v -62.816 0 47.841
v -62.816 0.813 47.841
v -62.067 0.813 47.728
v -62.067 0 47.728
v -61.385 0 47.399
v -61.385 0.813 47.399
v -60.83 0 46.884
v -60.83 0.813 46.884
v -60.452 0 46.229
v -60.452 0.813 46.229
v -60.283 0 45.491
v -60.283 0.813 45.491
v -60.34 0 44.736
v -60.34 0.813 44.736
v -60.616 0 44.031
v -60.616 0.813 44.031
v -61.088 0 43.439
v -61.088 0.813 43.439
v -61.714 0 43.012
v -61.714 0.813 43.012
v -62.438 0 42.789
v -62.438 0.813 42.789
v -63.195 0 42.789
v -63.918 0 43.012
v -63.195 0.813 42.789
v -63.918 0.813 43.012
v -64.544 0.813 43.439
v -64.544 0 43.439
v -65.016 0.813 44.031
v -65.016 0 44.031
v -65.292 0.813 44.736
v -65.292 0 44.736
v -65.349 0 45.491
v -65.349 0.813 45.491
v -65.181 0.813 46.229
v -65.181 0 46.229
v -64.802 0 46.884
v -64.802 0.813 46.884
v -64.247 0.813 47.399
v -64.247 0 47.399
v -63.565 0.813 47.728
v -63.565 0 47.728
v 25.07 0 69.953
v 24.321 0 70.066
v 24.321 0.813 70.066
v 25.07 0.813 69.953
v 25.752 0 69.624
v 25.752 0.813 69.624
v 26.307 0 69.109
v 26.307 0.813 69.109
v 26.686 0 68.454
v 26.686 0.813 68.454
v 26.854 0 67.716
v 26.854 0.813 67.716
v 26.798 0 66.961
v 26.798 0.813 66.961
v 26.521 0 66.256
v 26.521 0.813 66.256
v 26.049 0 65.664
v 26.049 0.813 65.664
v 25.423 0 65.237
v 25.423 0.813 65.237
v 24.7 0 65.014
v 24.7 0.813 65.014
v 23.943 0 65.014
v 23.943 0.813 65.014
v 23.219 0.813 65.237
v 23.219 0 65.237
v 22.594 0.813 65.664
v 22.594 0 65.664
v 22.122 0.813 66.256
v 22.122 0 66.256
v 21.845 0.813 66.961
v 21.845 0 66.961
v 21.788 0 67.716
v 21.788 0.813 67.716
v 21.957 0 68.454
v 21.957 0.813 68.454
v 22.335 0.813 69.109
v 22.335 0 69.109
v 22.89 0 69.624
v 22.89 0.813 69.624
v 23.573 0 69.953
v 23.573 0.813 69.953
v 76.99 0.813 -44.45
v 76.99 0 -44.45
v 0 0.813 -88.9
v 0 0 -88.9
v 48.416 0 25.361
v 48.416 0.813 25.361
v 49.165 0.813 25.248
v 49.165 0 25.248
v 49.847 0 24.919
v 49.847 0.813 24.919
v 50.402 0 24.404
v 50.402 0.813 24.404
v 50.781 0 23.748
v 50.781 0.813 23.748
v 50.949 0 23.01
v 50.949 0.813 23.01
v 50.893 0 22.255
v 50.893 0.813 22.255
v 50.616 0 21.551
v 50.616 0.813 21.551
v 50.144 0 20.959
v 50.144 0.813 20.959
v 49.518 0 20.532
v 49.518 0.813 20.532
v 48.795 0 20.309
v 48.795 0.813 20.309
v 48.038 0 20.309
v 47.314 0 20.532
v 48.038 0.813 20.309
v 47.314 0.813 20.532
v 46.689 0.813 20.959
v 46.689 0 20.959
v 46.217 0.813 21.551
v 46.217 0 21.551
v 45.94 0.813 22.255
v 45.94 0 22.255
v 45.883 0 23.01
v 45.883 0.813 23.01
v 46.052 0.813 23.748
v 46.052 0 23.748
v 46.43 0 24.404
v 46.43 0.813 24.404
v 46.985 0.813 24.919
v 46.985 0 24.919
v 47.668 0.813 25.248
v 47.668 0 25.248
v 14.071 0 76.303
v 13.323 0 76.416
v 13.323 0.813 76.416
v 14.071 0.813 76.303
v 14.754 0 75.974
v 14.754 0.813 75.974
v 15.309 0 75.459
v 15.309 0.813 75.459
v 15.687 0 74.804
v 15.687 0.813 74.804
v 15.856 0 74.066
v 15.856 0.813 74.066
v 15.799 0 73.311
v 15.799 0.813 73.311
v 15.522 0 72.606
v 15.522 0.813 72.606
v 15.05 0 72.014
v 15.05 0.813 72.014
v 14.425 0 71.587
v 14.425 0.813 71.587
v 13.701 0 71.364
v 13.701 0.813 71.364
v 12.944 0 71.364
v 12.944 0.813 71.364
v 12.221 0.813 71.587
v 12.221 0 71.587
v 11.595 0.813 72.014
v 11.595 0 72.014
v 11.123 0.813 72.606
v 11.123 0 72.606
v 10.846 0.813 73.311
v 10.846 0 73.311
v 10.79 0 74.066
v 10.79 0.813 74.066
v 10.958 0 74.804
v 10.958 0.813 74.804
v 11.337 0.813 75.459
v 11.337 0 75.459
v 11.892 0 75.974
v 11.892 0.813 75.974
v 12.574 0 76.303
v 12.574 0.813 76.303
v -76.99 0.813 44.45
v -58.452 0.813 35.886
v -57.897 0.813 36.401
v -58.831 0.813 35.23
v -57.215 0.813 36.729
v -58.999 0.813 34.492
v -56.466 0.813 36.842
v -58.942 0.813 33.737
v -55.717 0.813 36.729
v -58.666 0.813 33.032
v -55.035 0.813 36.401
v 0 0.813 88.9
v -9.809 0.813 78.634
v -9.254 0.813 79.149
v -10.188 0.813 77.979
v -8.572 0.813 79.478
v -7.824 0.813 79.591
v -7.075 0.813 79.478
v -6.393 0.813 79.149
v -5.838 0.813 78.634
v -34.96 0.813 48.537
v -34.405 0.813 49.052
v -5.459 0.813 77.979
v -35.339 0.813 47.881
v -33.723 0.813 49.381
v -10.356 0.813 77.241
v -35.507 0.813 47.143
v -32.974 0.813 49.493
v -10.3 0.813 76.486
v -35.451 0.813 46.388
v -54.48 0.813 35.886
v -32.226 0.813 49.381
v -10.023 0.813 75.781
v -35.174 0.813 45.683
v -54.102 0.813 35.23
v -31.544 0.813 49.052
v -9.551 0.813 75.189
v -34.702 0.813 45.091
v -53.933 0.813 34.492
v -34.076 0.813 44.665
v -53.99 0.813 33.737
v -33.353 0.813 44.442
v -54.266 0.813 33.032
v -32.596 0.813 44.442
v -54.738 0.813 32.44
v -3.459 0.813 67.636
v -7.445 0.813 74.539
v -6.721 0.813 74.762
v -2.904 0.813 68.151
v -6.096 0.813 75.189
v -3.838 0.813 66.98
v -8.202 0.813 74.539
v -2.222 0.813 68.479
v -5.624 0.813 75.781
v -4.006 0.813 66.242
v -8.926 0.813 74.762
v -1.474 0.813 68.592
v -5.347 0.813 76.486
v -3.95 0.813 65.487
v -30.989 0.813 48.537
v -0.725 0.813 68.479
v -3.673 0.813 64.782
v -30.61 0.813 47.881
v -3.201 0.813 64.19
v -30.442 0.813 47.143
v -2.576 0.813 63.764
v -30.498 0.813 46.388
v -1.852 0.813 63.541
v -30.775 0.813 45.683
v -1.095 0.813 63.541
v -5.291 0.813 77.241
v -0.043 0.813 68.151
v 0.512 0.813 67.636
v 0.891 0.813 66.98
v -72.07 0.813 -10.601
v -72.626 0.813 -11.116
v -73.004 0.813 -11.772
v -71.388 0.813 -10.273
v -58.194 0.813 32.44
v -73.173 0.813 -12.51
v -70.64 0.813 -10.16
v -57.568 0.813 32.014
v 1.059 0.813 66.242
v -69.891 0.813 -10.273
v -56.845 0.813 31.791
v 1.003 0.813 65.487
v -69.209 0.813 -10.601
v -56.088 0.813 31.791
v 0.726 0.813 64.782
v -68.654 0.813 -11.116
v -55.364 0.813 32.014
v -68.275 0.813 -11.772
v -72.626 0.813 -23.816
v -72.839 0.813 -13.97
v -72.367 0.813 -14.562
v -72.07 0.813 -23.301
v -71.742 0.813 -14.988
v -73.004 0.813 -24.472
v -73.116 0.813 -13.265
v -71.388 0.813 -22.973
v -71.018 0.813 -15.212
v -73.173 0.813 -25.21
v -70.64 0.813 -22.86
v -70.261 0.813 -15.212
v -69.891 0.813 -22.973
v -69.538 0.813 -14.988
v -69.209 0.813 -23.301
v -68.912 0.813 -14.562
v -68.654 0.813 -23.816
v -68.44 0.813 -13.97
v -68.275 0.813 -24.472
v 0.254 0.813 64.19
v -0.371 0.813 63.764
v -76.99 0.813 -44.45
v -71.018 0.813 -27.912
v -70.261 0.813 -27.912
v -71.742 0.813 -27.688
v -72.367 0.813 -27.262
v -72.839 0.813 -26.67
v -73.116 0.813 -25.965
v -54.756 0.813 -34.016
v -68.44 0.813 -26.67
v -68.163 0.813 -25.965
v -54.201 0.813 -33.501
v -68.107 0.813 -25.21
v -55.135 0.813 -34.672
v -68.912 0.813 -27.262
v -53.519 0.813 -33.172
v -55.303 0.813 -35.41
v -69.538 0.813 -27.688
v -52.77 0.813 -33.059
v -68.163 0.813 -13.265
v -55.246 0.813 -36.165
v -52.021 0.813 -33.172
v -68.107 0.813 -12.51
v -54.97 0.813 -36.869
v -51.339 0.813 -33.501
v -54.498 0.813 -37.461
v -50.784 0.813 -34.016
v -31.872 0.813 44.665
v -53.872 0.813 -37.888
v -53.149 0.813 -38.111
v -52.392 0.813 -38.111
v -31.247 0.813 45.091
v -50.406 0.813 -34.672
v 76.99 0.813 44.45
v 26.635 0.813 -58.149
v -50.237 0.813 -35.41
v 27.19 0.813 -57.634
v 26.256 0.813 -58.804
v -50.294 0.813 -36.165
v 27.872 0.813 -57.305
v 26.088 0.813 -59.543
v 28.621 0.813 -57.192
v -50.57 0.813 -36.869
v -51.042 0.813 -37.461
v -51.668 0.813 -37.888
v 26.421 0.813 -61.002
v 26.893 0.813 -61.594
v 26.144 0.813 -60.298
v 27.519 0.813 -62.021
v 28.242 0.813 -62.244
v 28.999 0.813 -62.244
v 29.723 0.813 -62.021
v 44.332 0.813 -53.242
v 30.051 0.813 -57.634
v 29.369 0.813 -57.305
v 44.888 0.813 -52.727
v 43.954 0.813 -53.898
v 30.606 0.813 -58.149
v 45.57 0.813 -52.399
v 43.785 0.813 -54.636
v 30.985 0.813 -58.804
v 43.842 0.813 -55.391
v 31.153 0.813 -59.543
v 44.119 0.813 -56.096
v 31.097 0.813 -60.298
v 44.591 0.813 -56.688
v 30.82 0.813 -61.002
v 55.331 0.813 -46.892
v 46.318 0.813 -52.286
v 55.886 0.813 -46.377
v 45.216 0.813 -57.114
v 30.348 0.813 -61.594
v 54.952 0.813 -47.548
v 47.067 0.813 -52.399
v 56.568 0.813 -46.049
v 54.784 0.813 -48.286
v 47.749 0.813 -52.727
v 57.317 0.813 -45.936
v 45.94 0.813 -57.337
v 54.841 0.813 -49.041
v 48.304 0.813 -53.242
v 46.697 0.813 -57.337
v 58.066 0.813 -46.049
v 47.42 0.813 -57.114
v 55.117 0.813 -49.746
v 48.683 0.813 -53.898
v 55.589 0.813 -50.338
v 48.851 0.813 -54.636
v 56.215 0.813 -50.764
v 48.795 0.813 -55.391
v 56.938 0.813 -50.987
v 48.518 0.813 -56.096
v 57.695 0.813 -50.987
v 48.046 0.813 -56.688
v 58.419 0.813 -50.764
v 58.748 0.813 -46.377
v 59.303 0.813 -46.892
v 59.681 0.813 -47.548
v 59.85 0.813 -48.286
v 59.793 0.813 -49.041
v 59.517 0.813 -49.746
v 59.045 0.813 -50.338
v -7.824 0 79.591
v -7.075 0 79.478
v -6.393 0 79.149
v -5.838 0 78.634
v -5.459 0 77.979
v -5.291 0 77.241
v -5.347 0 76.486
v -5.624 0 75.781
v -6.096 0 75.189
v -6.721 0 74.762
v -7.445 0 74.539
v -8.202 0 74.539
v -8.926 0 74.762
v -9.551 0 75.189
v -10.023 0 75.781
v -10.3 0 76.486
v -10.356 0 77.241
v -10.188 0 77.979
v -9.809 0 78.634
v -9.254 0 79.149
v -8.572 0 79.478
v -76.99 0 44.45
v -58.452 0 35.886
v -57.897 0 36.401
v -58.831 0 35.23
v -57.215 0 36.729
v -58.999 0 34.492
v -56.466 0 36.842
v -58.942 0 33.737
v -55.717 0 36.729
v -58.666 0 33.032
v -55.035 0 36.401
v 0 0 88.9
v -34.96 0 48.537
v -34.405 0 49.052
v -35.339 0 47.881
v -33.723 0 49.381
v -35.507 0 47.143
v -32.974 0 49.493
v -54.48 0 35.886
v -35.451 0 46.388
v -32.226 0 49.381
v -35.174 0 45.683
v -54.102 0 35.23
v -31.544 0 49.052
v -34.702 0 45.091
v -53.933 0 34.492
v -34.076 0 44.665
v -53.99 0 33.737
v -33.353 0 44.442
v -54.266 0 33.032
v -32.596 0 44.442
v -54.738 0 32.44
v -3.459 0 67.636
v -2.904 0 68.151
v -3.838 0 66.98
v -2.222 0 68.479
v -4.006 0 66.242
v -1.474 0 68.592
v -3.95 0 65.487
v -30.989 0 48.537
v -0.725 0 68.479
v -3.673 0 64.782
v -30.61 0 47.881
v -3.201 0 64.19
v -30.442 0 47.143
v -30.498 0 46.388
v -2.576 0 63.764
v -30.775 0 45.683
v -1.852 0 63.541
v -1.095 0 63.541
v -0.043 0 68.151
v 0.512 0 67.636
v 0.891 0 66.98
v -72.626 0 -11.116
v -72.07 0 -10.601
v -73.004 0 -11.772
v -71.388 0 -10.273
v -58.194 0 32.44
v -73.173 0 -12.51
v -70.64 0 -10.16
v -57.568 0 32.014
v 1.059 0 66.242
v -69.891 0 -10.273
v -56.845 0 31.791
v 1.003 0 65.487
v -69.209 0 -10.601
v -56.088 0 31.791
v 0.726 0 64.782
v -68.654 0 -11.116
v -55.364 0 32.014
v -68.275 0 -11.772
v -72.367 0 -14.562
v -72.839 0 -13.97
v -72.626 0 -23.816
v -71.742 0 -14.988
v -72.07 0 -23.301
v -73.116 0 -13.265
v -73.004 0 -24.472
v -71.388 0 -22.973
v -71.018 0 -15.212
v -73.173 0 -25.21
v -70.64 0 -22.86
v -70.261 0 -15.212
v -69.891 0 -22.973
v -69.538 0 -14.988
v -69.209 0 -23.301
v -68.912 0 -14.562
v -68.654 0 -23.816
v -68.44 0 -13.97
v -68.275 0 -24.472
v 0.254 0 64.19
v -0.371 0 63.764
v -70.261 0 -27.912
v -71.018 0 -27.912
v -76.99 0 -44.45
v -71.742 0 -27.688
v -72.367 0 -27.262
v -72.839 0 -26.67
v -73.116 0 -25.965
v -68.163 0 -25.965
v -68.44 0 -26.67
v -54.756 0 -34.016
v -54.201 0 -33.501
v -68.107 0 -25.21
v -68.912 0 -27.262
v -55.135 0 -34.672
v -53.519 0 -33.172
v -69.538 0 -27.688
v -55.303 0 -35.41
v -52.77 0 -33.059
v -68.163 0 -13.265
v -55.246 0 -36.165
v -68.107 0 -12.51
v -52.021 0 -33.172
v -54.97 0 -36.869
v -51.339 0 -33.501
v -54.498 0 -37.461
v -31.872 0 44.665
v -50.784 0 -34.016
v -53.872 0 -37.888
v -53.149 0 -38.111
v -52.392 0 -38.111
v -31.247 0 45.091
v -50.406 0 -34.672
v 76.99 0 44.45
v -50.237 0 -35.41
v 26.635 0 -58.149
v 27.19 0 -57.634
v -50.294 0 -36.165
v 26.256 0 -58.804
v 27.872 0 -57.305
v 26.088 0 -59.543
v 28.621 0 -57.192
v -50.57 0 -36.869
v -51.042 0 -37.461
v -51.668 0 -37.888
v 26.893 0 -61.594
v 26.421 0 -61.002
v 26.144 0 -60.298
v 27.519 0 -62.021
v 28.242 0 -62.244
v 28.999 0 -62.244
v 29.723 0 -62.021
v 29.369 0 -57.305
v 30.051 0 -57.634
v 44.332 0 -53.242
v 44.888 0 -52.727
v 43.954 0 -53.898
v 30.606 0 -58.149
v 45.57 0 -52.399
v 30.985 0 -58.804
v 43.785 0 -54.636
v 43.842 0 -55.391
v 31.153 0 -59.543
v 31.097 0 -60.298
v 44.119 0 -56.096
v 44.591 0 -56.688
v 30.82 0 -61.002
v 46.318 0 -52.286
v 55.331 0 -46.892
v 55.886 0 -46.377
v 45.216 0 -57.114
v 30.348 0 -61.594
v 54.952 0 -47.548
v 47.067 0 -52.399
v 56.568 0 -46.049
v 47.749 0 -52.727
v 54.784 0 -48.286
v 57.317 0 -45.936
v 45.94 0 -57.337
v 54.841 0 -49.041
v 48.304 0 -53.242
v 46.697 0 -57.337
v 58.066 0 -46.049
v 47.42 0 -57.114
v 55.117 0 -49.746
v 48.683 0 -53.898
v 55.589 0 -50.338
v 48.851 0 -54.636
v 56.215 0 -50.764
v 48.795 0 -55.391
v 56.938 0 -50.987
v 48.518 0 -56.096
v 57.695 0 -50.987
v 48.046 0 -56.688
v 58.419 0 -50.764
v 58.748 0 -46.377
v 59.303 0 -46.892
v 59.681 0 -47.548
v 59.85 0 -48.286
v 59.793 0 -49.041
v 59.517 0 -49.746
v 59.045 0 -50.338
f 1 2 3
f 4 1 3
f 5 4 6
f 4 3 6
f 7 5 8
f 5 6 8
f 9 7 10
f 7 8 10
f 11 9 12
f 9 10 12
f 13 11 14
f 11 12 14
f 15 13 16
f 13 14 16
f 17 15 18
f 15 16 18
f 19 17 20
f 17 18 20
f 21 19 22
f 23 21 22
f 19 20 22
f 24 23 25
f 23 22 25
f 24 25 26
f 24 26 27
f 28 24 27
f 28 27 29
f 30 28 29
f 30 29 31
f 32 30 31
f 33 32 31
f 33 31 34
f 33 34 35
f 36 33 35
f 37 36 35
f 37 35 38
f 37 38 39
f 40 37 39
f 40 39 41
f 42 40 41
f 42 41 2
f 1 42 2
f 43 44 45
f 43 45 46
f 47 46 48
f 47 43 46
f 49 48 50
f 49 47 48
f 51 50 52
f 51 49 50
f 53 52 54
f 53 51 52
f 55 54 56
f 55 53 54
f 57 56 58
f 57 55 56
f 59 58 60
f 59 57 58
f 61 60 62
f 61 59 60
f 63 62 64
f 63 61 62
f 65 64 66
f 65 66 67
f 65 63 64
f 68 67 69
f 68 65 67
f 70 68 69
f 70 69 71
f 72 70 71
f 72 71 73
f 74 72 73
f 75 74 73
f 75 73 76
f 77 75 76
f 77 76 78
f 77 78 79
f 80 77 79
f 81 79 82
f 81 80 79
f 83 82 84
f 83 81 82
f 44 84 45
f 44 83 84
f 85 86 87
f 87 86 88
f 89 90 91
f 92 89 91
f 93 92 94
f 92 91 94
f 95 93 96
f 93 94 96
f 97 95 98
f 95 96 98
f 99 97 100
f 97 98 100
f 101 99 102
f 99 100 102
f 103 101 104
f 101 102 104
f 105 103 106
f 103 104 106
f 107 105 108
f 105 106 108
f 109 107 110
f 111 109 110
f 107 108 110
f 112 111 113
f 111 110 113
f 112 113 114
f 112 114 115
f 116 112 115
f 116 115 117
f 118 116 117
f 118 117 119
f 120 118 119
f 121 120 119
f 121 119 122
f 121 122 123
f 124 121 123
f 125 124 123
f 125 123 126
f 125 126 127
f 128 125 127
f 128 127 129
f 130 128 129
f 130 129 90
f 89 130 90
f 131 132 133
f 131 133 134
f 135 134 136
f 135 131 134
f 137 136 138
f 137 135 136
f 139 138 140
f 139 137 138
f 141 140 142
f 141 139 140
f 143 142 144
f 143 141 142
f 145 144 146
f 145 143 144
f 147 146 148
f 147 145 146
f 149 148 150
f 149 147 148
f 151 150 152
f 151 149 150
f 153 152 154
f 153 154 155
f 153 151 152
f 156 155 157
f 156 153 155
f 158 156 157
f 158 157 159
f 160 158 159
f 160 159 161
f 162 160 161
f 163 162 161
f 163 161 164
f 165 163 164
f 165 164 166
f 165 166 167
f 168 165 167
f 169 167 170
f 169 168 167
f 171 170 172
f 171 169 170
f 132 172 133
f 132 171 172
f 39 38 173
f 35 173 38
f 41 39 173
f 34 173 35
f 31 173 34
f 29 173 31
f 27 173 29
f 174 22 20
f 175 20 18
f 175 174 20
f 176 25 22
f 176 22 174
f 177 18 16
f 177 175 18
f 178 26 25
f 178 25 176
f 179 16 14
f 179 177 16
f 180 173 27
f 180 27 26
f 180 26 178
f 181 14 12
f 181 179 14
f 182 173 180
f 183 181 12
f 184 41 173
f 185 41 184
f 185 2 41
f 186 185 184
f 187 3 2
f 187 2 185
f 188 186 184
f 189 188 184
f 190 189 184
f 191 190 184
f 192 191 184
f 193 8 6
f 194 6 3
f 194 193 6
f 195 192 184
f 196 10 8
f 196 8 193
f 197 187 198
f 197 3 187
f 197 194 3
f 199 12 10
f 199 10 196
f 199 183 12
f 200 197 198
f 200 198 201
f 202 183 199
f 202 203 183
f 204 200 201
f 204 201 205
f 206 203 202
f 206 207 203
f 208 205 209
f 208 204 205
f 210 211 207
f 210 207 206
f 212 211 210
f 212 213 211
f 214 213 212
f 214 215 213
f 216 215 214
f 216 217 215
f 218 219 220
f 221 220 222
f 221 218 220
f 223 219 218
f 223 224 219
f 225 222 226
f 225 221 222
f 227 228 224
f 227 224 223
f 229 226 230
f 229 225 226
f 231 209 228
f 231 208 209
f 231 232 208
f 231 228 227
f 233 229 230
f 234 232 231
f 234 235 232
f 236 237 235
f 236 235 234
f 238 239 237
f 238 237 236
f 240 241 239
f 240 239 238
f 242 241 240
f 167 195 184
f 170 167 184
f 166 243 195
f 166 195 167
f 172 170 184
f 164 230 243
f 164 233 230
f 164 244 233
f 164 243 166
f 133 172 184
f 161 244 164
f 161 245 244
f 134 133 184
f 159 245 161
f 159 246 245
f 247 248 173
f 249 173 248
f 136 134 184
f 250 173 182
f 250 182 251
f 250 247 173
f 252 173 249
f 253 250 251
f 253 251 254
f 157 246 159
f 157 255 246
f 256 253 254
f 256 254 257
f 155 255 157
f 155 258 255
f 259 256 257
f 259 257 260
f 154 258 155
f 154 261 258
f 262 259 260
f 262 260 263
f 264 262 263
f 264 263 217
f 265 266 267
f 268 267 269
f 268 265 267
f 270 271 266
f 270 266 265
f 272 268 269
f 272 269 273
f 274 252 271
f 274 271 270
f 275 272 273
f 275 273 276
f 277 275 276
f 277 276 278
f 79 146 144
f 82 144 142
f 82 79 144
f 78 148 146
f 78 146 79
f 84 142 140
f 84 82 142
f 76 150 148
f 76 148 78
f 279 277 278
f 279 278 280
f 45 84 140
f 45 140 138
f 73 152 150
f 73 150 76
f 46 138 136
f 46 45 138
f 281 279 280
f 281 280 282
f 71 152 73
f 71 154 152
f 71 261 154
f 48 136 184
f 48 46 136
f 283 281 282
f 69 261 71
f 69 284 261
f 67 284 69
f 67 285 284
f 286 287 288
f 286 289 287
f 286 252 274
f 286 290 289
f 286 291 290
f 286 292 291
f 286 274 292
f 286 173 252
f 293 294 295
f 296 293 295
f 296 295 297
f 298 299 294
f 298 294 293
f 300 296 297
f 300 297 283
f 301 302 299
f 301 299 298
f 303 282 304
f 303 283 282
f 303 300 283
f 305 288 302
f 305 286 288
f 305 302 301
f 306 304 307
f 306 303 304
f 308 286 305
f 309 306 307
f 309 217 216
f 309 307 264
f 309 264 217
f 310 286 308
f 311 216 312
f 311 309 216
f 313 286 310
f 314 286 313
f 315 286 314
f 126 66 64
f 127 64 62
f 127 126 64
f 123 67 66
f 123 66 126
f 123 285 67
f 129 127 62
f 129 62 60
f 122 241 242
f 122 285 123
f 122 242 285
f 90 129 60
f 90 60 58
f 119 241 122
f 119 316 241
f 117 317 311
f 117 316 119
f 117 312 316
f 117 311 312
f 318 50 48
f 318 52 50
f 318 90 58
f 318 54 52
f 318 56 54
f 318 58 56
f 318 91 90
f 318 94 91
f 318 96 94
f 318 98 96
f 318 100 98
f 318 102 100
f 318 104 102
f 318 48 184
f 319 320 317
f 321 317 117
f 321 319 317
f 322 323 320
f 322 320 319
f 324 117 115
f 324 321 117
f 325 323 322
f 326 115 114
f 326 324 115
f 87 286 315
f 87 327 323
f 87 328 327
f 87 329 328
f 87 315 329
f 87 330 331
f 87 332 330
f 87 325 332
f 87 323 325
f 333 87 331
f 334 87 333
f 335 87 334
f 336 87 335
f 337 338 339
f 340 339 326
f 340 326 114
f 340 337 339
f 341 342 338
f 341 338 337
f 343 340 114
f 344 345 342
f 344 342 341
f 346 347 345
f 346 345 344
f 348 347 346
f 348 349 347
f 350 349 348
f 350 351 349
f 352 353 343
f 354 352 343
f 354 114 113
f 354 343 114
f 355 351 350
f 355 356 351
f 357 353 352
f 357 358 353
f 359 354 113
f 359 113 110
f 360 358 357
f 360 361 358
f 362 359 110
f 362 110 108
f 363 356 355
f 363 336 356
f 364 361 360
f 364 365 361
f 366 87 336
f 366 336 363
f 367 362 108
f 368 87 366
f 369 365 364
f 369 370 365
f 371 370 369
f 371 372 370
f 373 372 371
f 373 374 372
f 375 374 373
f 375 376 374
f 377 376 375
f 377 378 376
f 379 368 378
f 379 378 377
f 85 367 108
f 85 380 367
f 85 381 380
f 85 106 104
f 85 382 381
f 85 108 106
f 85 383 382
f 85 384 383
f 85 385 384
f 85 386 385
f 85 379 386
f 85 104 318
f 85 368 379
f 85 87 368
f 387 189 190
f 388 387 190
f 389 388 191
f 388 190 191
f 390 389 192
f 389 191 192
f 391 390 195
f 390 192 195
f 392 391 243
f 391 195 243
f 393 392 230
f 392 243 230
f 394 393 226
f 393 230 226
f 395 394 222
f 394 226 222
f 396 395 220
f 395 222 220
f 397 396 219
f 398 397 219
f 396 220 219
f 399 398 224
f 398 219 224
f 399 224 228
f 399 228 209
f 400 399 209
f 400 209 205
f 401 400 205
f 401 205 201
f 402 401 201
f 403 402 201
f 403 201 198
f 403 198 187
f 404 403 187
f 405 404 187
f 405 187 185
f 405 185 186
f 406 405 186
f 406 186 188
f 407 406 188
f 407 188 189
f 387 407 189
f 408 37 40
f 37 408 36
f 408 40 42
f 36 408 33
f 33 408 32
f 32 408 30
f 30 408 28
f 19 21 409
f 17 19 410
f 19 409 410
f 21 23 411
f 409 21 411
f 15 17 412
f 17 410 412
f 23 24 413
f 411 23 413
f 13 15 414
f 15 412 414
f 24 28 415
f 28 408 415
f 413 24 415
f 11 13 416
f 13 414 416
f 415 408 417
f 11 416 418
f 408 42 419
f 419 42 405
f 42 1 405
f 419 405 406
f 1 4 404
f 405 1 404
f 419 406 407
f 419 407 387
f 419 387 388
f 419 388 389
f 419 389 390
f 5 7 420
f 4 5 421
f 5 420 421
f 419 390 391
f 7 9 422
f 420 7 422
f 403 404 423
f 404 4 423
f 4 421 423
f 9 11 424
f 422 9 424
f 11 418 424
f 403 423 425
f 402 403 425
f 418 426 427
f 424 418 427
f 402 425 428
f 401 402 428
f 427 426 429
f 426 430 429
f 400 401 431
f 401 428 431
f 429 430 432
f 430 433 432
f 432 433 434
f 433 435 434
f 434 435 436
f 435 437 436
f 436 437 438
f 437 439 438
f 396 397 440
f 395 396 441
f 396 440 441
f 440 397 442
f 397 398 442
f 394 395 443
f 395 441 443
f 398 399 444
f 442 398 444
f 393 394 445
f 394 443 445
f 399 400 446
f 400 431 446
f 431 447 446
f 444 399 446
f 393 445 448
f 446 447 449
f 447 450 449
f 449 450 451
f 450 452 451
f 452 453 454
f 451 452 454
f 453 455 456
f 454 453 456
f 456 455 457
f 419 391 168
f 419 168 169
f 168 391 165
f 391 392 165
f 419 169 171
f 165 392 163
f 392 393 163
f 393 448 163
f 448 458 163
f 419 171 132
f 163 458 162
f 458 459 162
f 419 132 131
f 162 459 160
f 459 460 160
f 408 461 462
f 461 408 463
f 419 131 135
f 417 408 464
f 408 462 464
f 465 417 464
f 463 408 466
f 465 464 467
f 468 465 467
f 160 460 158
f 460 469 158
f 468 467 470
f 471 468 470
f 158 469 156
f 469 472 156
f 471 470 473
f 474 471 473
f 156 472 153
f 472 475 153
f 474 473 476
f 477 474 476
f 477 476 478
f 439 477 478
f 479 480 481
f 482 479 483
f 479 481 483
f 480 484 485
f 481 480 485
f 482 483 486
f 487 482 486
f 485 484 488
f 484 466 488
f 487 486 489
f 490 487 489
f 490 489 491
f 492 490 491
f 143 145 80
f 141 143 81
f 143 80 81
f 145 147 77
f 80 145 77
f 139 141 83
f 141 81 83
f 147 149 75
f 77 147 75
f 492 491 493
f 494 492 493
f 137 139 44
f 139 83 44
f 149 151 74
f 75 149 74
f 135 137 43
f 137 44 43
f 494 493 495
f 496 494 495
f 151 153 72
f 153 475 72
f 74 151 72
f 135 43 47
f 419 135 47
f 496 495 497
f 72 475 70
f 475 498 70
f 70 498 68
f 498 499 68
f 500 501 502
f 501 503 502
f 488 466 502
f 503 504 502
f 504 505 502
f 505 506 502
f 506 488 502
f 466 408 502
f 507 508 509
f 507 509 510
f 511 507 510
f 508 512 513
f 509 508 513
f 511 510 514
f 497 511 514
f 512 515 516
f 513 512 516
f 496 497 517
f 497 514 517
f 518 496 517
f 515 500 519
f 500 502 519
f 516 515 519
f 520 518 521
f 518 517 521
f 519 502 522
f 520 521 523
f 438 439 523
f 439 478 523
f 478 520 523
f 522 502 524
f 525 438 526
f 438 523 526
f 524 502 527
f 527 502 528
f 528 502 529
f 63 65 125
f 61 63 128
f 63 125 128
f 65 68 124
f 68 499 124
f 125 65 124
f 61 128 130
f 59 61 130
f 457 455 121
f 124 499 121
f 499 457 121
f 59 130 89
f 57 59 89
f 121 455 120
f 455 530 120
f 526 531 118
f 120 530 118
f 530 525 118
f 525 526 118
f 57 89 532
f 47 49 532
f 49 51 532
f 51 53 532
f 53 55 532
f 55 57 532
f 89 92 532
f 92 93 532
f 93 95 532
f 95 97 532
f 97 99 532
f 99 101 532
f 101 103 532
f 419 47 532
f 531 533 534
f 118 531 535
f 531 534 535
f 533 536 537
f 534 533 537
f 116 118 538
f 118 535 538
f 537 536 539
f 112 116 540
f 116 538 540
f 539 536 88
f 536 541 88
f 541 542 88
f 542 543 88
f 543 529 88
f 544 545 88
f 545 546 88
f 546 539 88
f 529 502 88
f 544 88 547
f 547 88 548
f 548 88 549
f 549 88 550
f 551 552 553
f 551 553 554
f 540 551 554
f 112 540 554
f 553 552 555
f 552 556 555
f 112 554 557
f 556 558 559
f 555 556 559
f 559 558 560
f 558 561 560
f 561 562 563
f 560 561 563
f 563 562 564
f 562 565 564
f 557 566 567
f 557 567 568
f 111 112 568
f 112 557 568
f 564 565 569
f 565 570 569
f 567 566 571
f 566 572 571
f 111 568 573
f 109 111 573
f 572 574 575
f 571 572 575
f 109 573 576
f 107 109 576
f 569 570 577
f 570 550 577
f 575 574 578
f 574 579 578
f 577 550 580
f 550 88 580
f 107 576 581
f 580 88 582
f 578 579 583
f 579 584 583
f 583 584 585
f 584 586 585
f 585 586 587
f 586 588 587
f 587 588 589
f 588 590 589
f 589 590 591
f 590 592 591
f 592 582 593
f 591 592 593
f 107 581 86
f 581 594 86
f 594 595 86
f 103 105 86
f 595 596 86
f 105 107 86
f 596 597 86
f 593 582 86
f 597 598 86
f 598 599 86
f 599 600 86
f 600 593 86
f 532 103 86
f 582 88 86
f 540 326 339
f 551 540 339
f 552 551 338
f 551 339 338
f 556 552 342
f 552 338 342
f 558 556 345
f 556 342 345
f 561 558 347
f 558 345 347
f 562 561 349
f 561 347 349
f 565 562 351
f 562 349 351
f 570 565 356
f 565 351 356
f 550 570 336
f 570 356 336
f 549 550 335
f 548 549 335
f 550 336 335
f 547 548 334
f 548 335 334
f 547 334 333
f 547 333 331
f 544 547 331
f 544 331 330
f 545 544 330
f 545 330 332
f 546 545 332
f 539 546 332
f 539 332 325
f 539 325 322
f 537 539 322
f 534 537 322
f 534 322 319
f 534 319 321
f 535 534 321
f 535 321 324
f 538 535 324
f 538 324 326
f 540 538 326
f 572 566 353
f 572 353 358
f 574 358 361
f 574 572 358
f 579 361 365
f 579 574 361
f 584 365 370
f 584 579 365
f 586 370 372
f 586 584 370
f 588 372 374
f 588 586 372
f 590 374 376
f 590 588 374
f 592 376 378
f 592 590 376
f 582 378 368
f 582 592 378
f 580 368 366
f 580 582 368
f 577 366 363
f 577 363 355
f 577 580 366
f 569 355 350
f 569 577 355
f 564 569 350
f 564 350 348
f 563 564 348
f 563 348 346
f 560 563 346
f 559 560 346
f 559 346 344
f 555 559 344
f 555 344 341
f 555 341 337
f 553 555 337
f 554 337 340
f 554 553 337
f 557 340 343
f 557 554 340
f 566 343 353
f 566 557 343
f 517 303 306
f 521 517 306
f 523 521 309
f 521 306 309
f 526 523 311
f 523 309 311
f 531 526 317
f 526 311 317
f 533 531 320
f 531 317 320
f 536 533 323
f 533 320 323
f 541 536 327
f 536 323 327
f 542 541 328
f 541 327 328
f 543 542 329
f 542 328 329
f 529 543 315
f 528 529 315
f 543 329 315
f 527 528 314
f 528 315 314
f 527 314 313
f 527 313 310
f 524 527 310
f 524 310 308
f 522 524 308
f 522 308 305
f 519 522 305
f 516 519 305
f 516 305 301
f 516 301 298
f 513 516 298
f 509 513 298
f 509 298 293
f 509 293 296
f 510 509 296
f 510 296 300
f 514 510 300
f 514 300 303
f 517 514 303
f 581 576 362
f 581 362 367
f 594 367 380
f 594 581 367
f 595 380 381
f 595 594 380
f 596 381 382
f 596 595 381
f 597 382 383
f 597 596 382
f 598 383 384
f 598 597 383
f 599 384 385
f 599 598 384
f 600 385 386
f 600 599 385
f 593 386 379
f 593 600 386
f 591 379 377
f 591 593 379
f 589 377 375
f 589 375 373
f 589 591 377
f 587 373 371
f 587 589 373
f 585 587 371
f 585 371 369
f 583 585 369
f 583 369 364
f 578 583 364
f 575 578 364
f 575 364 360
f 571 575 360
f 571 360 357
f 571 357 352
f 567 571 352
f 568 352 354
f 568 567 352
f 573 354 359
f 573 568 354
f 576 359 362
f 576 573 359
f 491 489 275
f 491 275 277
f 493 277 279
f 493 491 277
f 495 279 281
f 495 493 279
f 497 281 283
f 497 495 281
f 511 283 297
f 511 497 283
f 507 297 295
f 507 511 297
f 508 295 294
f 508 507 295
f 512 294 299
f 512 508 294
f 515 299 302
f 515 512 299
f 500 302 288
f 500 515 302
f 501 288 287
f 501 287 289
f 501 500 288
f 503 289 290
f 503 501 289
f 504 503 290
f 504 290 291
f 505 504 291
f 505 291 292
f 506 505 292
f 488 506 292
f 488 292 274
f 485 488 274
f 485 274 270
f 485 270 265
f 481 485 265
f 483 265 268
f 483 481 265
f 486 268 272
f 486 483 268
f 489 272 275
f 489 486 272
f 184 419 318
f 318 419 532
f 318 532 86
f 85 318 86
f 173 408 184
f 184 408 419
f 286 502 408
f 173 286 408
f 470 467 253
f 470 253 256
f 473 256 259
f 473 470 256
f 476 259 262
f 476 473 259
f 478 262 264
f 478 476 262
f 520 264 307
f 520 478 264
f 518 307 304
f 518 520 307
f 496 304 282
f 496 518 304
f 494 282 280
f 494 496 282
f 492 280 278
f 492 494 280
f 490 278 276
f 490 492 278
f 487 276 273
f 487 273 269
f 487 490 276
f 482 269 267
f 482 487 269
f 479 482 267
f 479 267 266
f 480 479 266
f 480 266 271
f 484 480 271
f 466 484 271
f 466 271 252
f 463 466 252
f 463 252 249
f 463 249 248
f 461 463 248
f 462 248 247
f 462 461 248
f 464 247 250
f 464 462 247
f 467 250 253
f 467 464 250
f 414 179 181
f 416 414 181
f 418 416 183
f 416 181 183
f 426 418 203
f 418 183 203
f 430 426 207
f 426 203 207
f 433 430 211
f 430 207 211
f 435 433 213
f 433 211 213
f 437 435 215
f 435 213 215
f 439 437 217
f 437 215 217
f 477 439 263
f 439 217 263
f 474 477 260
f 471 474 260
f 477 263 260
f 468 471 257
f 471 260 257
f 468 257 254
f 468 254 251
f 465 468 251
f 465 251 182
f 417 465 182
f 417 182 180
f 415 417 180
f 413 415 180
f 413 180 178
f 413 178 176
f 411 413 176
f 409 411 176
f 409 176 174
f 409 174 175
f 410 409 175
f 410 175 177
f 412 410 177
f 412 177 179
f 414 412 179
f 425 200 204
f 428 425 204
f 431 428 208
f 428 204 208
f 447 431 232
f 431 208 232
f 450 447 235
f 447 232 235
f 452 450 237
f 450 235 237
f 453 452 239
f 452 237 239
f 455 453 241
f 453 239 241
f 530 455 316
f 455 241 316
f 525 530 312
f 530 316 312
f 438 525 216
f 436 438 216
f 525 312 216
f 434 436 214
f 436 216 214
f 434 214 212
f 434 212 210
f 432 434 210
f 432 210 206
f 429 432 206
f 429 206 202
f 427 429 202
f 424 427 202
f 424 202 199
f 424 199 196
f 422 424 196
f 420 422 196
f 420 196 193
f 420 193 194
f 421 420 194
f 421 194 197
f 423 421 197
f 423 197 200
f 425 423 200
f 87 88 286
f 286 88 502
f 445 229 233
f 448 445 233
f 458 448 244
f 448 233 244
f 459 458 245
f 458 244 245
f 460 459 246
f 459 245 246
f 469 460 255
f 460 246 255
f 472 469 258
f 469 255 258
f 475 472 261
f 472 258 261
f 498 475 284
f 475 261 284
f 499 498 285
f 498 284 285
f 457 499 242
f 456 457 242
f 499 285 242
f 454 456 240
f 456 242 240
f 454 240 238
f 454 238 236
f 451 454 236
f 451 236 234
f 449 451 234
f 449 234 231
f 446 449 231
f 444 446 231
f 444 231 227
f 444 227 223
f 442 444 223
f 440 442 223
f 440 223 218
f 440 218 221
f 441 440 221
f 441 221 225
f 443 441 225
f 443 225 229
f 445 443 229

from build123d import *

# Parameters (mm, degrees)
SKETCH1_R           = 2.54
BOSS_EXTRUDE1_DEPTH = 0.8128
SKETCH2_R           = 2.54
CUT_EXTRUDE1_DEPTH  = 118.606454516
SKETCH3_R           = 2.54
CUT_EXTRUDE2_DEPTH  = 118.606454516


with BuildPart() as part:
    # Sketch1 → Boss-Extrude1 (new body)
    with BuildSketch(Plane(origin=(0, 0, 0), x_dir=(1, 0, 0), z_dir=(0, 1, 0))):
        Polygon((0, 88.9), (-76.989658396, 44.45), (-76.989658396, -44.45), (0, -88.9), (76.989658396, -44.45), (76.989658396, 44.45), align=None)
        with Locations(Location((13.322783942, -73.875738686, 0), (0, 0, 270))):
            Circle(SKETCH1_R, mode=Mode.SUBTRACT)
        with Locations(Location((24.32130657, -67.525738686, 0), (0, 0, 270))):
            Circle(SKETCH1_R, mode=Mode.SUBTRACT)
        with Locations(Location((-70.639658396, 12.7, 0), (0, 0, 270))):
            Circle(SKETCH1_R, mode=Mode.SUBTRACT)
        with Locations(Location((-70.639658396, 25.4, 0), (0, 0, 270))):
            Circle(SKETCH1_R, mode=Mode.SUBTRACT)
        with Locations(Location((46.318351826, 54.825738686, 0), (0, 0, 270))):
            Circle(SKETCH1_R, mode=Mode.SUBTRACT)
        with Locations(Location((57.316874454, 48.475738686, 0), (0, 0, 270))):
            Circle(SKETCH1_R, mode=Mode.SUBTRACT)
    extrude(amount=BOSS_EXTRUDE1_DEPTH)

    # Sketch2 → Cut-Extrude1 (cut, through all)
    with BuildSketch(Plane(origin=(0, 0.8128, 0), x_dir=(1, 0, 0), z_dir=(0, 1, 0))):
        with Locations(Location((28.620590949, 59.732317666, 0), (0, 0, 270))):
            Circle(SKETCH2_R)
        with Locations(Location((48.416295038, -22.82051708, 0), (0, 0, 270))):
            Circle(SKETCH2_R)
        with Locations(Location((-52.77011314, 35.59948292, 0), (0, 0, 270))):
            Circle(SKETCH2_R)
        with Locations(Location((-32.974409051, -46.953351826, 0), (0, 0, 270))):
            Circle(SKETCH2_R)
    extrude(amount=-CUT_EXTRUDE1_DEPTH, mode=Mode.SUBTRACT)

    # Sketch3 → Cut-Extrude2 (cut, through all)
    with BuildSketch(Plane(origin=(0, 0.8128, 0), x_dir=(1, 0, 0), z_dir=(0, 1, 0))):
        with Locations(Location((-7.823522628, -77.050738686, 0), (0, 0, 270))):
            Circle(SKETCH3_R)
        with Locations(Location((-62.816135768, -45.300738686, 0), (0, 0, 270))):
            Circle(SKETCH3_R)
        with Locations(Location((-56.466135768, -34.302216058, 0), (0, 0, 270))):
            Circle(SKETCH3_R)
        with Locations(Location((-1.473522628, -66.052216058, 0), (0, 0, 270))):
            Circle(SKETCH3_R)
    extrude(amount=-CUT_EXTRUDE2_DEPTH, mode=Mode.SUBTRACT)


solid = part.part
